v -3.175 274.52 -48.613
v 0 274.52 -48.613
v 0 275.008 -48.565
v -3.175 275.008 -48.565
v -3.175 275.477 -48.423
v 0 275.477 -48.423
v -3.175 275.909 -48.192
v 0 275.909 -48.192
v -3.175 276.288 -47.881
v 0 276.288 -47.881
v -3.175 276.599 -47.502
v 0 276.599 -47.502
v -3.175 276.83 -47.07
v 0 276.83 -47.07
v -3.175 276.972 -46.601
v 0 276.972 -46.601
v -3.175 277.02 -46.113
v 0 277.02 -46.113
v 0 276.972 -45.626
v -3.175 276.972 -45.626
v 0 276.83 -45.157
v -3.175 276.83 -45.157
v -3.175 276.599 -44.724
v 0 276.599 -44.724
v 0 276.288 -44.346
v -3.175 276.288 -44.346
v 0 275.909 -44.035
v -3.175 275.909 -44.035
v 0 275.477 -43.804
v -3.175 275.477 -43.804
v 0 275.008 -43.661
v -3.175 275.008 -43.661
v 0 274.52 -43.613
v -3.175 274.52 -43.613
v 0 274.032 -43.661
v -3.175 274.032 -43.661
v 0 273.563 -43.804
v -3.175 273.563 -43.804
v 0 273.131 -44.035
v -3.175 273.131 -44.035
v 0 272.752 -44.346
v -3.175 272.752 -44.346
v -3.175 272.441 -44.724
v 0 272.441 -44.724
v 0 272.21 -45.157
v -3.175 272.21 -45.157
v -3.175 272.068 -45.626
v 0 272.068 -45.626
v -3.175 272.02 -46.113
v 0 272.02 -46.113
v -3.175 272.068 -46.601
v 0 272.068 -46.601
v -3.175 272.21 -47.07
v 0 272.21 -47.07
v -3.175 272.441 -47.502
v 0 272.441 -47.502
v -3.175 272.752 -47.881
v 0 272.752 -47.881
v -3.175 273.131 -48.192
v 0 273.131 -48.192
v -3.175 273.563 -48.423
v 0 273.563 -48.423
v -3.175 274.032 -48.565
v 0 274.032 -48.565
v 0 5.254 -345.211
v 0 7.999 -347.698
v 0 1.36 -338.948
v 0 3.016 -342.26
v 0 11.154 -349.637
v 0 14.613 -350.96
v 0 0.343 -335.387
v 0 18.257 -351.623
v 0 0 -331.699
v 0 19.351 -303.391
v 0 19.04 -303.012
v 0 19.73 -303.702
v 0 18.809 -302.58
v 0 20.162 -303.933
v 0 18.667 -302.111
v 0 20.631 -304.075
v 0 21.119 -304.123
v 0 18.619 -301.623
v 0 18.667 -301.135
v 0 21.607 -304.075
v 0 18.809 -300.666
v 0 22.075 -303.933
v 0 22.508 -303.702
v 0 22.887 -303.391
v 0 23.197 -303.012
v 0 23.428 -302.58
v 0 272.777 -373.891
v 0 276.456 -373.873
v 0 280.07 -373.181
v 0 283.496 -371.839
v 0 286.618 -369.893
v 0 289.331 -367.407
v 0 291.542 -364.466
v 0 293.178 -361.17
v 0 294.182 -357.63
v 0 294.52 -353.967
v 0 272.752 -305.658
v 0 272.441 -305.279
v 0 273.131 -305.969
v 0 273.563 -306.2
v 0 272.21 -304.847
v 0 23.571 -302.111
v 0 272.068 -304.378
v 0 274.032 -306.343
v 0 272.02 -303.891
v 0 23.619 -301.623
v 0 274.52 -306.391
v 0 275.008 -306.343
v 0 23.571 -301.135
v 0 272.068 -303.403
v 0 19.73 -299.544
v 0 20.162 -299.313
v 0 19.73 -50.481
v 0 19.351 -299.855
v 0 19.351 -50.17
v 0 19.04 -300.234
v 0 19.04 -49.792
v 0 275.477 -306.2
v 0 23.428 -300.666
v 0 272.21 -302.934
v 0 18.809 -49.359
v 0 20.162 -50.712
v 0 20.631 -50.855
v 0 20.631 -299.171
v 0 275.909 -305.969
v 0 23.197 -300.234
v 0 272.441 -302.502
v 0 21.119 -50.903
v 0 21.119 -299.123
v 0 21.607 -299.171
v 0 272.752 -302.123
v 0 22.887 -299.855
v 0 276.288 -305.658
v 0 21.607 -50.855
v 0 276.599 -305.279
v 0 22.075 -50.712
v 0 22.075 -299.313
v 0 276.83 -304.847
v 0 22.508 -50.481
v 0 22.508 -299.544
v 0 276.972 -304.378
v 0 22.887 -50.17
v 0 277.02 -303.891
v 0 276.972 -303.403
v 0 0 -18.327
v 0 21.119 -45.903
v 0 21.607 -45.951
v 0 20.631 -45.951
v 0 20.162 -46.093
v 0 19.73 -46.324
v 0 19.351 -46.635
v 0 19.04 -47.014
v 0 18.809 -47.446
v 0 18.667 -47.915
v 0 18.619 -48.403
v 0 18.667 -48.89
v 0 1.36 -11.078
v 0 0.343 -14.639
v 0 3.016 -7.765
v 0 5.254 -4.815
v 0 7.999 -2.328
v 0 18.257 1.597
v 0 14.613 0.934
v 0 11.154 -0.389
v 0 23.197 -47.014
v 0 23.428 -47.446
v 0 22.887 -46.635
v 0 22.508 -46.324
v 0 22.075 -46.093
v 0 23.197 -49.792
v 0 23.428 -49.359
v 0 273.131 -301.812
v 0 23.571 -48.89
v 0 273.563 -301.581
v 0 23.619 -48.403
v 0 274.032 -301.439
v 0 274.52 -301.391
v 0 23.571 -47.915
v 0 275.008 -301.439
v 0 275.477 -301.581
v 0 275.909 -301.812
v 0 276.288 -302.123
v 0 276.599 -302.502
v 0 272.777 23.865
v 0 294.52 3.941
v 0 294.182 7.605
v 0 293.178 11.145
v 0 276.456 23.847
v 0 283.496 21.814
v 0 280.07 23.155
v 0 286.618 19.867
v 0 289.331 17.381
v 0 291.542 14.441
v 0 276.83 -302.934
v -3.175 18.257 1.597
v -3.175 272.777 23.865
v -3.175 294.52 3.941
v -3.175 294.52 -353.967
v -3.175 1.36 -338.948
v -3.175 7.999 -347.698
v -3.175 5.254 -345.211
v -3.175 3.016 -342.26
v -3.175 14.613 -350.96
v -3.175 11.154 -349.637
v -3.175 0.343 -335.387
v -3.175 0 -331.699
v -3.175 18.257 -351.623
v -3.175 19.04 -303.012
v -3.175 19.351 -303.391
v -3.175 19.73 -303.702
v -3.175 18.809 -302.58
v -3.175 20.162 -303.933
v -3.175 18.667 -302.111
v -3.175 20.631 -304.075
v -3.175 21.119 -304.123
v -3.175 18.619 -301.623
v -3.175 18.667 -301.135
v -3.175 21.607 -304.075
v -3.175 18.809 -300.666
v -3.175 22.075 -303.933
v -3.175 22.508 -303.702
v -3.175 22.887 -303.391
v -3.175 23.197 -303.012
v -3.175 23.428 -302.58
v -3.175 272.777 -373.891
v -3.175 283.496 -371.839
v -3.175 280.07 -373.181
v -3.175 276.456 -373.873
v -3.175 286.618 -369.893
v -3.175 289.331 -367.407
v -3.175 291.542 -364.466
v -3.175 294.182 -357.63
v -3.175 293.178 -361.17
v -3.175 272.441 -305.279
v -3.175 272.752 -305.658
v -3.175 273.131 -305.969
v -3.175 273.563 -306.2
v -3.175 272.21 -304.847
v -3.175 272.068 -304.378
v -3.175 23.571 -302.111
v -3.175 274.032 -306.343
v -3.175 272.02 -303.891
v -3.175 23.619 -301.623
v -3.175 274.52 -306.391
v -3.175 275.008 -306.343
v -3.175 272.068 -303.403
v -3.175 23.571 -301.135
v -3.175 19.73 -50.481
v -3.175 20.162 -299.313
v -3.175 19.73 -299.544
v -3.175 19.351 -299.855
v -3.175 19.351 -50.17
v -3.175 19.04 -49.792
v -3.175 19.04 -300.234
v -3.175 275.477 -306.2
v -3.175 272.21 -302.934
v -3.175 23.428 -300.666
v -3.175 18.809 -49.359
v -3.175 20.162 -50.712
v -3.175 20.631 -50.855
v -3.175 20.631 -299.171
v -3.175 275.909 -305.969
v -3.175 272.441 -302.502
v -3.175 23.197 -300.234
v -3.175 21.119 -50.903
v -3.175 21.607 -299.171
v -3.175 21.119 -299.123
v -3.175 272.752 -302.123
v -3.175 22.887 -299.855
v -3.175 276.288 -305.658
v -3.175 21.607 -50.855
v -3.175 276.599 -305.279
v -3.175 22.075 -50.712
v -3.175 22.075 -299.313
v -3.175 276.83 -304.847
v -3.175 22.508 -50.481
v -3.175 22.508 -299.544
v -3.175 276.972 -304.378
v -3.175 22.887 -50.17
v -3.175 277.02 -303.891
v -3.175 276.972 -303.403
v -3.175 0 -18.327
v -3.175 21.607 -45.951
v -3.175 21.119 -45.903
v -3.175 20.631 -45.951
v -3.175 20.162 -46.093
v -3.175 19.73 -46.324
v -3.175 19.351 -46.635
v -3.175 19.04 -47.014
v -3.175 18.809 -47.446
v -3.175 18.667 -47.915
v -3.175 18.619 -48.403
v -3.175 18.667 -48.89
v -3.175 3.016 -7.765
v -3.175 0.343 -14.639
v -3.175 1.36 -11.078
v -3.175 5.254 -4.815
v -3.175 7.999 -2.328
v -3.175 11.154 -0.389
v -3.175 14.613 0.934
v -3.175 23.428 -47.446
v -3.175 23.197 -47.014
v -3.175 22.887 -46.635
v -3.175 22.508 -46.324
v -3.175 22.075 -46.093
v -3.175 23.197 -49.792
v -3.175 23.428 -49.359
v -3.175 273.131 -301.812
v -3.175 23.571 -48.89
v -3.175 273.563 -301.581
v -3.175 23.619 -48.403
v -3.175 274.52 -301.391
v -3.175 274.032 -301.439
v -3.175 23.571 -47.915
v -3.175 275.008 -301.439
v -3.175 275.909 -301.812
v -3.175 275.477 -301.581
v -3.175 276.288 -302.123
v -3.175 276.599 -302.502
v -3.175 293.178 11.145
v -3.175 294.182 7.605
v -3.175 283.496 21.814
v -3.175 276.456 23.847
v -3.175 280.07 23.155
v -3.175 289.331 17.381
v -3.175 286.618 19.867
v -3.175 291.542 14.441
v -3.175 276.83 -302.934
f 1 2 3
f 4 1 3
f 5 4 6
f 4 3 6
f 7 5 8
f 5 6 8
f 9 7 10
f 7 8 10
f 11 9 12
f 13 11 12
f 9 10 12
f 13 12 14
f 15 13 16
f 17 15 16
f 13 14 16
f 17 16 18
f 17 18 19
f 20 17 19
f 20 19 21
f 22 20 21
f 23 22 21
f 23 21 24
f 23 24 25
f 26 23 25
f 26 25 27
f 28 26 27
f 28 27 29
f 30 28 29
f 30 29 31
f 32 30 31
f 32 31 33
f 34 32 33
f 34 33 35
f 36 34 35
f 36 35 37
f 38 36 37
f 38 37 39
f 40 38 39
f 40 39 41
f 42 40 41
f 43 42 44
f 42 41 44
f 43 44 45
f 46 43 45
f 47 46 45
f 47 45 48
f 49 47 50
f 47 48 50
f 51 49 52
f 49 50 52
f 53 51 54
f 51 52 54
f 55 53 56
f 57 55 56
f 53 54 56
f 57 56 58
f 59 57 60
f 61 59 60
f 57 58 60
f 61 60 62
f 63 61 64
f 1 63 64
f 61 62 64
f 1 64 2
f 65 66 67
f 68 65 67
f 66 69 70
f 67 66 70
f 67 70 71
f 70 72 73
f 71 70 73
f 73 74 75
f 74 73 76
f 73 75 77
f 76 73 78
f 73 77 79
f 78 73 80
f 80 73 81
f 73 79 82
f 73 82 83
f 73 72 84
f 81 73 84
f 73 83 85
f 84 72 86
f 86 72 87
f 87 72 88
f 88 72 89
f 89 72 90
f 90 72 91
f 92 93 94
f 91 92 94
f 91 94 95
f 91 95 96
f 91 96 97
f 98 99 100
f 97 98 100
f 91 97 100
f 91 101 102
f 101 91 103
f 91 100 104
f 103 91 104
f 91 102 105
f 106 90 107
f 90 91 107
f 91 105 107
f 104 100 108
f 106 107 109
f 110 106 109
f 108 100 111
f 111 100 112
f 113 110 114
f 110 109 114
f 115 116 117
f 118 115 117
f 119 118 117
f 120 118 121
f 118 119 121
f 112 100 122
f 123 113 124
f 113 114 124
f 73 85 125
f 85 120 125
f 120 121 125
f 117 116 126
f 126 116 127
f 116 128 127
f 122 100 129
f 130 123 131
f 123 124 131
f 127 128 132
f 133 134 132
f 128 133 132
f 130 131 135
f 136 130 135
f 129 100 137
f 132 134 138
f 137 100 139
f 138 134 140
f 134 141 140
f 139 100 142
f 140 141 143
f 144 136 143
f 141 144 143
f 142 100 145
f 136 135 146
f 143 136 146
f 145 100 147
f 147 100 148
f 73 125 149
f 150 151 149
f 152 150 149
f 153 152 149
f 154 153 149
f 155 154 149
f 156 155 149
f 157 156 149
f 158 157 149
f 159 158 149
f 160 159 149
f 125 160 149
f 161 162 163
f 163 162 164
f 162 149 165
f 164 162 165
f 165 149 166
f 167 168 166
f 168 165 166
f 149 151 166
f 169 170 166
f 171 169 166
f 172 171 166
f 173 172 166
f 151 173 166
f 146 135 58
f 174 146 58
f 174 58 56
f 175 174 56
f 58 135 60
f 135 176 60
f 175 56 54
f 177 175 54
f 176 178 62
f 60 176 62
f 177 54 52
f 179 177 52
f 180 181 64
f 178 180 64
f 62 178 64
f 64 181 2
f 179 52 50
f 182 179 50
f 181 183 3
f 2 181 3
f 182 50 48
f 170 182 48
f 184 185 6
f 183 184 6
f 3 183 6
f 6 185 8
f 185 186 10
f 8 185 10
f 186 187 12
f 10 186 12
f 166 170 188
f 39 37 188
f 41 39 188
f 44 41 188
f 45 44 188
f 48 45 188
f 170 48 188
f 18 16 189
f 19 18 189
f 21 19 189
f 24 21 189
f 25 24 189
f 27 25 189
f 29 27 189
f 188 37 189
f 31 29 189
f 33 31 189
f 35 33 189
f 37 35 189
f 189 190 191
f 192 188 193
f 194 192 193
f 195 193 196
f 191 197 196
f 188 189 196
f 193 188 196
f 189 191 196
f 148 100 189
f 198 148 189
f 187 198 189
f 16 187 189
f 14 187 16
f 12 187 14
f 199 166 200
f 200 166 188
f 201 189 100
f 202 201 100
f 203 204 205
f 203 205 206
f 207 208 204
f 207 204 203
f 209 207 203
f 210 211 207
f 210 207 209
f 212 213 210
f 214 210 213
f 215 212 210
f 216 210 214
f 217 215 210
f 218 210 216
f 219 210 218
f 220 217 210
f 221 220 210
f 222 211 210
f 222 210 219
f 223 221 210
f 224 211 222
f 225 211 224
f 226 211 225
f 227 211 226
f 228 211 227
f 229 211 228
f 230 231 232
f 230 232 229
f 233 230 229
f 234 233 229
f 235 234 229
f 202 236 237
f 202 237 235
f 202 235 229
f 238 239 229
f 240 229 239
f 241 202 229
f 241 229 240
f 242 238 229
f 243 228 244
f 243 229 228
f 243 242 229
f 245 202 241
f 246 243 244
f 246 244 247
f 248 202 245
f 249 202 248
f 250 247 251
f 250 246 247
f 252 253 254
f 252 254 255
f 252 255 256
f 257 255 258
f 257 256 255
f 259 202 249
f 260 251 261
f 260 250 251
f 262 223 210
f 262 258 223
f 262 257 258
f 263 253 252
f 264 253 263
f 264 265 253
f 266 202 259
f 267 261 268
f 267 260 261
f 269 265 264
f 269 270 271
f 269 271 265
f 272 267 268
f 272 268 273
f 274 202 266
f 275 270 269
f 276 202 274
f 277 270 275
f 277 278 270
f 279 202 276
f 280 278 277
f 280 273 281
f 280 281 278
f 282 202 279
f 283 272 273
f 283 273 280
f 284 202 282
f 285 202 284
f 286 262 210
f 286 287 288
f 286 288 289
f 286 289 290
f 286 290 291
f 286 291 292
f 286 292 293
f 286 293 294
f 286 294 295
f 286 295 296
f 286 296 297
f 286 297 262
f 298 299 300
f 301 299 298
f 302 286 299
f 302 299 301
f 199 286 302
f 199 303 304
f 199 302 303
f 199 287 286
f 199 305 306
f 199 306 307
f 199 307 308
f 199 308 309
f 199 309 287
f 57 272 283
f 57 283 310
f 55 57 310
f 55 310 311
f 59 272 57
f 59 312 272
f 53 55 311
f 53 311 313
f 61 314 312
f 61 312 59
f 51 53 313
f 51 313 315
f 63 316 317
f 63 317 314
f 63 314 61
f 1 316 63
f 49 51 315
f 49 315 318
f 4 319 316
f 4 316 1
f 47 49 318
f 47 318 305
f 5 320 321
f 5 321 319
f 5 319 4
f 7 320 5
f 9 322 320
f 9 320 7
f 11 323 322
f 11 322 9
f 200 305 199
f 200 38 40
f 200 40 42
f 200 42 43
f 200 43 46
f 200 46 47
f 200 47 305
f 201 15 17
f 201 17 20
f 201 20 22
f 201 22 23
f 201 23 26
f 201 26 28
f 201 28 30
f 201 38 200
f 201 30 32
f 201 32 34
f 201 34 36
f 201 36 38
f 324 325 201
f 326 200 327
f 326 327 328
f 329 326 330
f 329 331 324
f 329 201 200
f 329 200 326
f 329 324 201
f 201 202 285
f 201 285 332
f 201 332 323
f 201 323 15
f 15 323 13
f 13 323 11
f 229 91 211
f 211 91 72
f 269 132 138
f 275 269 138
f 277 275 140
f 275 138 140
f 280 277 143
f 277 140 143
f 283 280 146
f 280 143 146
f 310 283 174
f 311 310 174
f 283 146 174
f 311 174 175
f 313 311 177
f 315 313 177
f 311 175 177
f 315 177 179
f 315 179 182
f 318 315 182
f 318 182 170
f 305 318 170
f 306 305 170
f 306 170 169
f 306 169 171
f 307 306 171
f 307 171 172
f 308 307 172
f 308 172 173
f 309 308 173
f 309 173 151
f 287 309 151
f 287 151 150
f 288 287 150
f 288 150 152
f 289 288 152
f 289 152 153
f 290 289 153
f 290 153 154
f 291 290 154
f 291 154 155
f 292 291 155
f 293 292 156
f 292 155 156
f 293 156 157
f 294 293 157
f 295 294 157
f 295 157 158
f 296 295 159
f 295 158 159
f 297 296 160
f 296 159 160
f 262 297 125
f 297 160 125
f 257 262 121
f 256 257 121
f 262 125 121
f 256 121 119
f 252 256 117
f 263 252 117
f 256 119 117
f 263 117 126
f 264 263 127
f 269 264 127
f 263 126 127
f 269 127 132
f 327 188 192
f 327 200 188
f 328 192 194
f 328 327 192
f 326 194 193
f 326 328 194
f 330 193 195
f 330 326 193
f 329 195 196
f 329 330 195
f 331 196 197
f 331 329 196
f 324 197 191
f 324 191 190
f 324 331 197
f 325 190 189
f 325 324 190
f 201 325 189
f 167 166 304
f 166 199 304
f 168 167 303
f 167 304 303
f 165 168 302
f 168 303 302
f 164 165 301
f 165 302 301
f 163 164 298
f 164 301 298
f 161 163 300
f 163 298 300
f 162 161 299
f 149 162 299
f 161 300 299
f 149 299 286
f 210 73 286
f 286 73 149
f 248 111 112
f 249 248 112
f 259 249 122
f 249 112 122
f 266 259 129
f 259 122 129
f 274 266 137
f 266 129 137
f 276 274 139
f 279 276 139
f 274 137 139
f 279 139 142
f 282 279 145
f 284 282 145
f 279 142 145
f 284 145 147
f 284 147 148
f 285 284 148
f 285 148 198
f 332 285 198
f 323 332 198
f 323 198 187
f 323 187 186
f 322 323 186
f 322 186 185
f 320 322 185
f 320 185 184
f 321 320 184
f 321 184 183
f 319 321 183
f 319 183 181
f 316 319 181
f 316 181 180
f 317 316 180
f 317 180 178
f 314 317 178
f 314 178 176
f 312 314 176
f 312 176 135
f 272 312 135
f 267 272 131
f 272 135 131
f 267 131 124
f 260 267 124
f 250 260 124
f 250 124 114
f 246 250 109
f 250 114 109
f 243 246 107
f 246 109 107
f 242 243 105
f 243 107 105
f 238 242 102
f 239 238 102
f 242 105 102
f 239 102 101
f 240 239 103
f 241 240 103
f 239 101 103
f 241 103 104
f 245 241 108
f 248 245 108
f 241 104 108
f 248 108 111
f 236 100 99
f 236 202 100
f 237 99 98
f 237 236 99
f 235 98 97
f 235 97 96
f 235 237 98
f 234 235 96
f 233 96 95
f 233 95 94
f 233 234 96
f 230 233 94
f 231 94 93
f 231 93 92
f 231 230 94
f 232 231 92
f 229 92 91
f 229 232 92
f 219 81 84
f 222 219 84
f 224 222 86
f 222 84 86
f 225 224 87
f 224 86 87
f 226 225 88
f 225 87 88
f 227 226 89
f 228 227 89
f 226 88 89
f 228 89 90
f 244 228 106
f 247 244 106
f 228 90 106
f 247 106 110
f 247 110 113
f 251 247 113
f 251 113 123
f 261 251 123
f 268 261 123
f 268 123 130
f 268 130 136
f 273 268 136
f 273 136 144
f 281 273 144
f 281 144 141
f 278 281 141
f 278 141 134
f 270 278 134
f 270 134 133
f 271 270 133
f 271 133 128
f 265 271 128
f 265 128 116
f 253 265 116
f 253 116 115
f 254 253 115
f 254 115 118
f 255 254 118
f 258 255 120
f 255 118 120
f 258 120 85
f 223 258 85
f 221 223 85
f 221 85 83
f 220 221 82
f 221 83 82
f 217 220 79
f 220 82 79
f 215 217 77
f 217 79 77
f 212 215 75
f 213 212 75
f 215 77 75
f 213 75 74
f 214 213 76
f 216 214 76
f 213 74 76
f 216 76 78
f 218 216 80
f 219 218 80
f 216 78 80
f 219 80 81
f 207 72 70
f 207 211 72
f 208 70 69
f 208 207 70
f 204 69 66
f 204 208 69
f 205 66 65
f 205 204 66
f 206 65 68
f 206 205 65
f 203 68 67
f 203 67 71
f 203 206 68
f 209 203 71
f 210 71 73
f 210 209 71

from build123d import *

# Parameters (mm, degrees)
BASE_FLANGE1_DEPTH = 3.175
FILLET1_R          = 20
SKETCH2_R          = 2.5
CUT_EXTRUDE1_DEPTH = 10


# Sheet-metal steps are written as plain solids
with BuildPart() as part:
    # Sketch1 → Base-Flange1 (new body)
    with BuildSketch(Plane(origin=(0, 0, 0), x_dir=(0, 0, -1), z_dir=(1, 0, 0))):
        Polygon((0, 0), (-25.767161182, 294.52), (375.792838818, 294.52), (350.025677637, 0), align=None)
    extrude(amount=-BASE_FLANGE1_DEPTH)

    # Fillet1
    fillet1_edges = [part.edges().sort_by_distance(p)[0] for p in [
        (-1.5875, 0, 0),
        (-1.5875, 294.52, 25.767161182),
        (-1.5875, 294.52, -375.792838818),
        (-1.5875, 0, -350.025677637),
    ]]
    fillet(fillet1_edges, radius=FILLET1_R)

    # Sketch2 → Cut-Extrude1 (cut)
    with BuildSketch(Plane(origin=(0, 0, 0), x_dir=(0, 0, -1), z_dir=(1, 0, 0))):
        with Locations((46.113408302, 274.52)):
            Circle(SKETCH2_R)
        with Locations((303.890562759, 274.52)):
            Circle(SKETCH2_R)
        with Locations((48.402729519, 21.11878104)):
            Circle(SKETCH2_R)
        with Locations((301.622948118, 21.11878104)):
            Circle(SKETCH2_R)
    extrude(amount=-CUT_EXTRUDE1_DEPTH, mode=Mode.SUBTRACT)


solid = part.part
